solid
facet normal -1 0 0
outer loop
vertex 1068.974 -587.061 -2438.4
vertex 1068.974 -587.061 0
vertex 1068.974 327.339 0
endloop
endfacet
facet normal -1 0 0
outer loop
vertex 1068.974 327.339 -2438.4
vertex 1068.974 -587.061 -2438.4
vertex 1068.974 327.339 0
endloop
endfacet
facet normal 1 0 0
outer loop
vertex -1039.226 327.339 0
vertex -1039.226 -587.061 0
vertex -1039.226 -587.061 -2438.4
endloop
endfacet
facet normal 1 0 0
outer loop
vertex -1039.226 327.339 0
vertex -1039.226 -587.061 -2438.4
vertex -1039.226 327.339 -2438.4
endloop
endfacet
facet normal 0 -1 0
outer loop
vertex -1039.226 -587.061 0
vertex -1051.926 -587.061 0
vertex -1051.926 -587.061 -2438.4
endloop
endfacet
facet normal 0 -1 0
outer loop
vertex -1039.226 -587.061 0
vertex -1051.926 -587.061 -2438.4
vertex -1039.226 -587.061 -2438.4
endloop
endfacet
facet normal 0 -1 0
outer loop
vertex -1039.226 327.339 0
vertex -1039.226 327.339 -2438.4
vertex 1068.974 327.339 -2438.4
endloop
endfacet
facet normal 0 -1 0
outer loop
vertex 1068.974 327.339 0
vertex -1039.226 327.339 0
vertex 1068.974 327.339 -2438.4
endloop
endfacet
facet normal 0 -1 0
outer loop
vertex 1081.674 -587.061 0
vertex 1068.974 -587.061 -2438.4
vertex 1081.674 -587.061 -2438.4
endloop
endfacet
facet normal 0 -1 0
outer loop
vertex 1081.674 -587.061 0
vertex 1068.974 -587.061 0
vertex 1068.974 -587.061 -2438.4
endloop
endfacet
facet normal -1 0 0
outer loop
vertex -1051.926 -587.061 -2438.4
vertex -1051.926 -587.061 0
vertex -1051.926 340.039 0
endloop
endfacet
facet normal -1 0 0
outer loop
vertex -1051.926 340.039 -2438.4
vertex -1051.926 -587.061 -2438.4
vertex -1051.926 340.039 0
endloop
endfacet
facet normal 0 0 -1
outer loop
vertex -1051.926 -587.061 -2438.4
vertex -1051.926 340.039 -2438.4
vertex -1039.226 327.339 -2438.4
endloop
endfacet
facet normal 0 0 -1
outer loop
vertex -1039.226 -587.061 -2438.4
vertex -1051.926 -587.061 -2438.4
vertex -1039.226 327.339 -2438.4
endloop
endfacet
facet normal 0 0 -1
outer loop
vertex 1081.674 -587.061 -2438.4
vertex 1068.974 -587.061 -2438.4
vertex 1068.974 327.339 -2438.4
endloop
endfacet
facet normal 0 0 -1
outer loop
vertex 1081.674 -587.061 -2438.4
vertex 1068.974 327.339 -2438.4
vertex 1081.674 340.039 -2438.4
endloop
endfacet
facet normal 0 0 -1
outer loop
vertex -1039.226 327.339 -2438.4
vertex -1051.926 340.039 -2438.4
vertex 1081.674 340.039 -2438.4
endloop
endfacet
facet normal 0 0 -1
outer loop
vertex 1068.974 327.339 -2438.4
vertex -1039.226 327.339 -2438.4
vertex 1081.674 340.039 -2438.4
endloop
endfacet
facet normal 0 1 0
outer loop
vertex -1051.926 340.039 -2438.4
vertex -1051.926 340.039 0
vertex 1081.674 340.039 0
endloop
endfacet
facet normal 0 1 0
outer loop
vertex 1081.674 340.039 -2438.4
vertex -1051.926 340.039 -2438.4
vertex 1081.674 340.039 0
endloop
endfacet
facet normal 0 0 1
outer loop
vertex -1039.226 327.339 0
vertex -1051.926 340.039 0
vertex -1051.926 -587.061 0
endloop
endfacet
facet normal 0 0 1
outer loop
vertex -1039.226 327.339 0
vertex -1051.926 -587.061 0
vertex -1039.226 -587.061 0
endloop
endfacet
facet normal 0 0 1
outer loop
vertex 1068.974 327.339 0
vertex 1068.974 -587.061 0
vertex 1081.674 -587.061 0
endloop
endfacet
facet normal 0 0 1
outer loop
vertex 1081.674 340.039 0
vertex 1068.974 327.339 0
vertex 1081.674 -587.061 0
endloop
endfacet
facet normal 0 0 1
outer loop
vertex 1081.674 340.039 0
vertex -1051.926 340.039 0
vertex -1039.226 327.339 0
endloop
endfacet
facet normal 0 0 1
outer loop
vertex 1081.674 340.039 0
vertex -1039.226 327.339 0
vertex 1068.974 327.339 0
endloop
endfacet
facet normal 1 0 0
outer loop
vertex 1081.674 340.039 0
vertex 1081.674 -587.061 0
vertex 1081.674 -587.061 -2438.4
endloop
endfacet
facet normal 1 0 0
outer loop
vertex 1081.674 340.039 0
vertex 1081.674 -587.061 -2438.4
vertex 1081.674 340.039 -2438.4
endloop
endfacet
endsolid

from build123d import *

# Parameters (mm, degrees)
F0_W     = 2133.6
F0_H     = 927.1
F1_DEPTH = 2438.4
F2_T     = -12.7


with BuildPart() as f1:
    # F0 (on Top) → F1 (new body)
    with BuildSketch(Plane.XY):
        with Locations((14.874363, -123.510646)):
            Rectangle(F0_W, F0_H)
    extrude(amount=-F1_DEPTH)

    # F2
    f2_openings = [f1.faces().sort_by_distance(p)[0] for p in [
        (14.874363, -123.510646, 0),
        (14.874363, -587.060646, -1219.2),
        (14.874363, -123.510646, -2438.4),
    ]]
    offset(amount=F2_T, openings=f2_openings)


solid = f1.part
